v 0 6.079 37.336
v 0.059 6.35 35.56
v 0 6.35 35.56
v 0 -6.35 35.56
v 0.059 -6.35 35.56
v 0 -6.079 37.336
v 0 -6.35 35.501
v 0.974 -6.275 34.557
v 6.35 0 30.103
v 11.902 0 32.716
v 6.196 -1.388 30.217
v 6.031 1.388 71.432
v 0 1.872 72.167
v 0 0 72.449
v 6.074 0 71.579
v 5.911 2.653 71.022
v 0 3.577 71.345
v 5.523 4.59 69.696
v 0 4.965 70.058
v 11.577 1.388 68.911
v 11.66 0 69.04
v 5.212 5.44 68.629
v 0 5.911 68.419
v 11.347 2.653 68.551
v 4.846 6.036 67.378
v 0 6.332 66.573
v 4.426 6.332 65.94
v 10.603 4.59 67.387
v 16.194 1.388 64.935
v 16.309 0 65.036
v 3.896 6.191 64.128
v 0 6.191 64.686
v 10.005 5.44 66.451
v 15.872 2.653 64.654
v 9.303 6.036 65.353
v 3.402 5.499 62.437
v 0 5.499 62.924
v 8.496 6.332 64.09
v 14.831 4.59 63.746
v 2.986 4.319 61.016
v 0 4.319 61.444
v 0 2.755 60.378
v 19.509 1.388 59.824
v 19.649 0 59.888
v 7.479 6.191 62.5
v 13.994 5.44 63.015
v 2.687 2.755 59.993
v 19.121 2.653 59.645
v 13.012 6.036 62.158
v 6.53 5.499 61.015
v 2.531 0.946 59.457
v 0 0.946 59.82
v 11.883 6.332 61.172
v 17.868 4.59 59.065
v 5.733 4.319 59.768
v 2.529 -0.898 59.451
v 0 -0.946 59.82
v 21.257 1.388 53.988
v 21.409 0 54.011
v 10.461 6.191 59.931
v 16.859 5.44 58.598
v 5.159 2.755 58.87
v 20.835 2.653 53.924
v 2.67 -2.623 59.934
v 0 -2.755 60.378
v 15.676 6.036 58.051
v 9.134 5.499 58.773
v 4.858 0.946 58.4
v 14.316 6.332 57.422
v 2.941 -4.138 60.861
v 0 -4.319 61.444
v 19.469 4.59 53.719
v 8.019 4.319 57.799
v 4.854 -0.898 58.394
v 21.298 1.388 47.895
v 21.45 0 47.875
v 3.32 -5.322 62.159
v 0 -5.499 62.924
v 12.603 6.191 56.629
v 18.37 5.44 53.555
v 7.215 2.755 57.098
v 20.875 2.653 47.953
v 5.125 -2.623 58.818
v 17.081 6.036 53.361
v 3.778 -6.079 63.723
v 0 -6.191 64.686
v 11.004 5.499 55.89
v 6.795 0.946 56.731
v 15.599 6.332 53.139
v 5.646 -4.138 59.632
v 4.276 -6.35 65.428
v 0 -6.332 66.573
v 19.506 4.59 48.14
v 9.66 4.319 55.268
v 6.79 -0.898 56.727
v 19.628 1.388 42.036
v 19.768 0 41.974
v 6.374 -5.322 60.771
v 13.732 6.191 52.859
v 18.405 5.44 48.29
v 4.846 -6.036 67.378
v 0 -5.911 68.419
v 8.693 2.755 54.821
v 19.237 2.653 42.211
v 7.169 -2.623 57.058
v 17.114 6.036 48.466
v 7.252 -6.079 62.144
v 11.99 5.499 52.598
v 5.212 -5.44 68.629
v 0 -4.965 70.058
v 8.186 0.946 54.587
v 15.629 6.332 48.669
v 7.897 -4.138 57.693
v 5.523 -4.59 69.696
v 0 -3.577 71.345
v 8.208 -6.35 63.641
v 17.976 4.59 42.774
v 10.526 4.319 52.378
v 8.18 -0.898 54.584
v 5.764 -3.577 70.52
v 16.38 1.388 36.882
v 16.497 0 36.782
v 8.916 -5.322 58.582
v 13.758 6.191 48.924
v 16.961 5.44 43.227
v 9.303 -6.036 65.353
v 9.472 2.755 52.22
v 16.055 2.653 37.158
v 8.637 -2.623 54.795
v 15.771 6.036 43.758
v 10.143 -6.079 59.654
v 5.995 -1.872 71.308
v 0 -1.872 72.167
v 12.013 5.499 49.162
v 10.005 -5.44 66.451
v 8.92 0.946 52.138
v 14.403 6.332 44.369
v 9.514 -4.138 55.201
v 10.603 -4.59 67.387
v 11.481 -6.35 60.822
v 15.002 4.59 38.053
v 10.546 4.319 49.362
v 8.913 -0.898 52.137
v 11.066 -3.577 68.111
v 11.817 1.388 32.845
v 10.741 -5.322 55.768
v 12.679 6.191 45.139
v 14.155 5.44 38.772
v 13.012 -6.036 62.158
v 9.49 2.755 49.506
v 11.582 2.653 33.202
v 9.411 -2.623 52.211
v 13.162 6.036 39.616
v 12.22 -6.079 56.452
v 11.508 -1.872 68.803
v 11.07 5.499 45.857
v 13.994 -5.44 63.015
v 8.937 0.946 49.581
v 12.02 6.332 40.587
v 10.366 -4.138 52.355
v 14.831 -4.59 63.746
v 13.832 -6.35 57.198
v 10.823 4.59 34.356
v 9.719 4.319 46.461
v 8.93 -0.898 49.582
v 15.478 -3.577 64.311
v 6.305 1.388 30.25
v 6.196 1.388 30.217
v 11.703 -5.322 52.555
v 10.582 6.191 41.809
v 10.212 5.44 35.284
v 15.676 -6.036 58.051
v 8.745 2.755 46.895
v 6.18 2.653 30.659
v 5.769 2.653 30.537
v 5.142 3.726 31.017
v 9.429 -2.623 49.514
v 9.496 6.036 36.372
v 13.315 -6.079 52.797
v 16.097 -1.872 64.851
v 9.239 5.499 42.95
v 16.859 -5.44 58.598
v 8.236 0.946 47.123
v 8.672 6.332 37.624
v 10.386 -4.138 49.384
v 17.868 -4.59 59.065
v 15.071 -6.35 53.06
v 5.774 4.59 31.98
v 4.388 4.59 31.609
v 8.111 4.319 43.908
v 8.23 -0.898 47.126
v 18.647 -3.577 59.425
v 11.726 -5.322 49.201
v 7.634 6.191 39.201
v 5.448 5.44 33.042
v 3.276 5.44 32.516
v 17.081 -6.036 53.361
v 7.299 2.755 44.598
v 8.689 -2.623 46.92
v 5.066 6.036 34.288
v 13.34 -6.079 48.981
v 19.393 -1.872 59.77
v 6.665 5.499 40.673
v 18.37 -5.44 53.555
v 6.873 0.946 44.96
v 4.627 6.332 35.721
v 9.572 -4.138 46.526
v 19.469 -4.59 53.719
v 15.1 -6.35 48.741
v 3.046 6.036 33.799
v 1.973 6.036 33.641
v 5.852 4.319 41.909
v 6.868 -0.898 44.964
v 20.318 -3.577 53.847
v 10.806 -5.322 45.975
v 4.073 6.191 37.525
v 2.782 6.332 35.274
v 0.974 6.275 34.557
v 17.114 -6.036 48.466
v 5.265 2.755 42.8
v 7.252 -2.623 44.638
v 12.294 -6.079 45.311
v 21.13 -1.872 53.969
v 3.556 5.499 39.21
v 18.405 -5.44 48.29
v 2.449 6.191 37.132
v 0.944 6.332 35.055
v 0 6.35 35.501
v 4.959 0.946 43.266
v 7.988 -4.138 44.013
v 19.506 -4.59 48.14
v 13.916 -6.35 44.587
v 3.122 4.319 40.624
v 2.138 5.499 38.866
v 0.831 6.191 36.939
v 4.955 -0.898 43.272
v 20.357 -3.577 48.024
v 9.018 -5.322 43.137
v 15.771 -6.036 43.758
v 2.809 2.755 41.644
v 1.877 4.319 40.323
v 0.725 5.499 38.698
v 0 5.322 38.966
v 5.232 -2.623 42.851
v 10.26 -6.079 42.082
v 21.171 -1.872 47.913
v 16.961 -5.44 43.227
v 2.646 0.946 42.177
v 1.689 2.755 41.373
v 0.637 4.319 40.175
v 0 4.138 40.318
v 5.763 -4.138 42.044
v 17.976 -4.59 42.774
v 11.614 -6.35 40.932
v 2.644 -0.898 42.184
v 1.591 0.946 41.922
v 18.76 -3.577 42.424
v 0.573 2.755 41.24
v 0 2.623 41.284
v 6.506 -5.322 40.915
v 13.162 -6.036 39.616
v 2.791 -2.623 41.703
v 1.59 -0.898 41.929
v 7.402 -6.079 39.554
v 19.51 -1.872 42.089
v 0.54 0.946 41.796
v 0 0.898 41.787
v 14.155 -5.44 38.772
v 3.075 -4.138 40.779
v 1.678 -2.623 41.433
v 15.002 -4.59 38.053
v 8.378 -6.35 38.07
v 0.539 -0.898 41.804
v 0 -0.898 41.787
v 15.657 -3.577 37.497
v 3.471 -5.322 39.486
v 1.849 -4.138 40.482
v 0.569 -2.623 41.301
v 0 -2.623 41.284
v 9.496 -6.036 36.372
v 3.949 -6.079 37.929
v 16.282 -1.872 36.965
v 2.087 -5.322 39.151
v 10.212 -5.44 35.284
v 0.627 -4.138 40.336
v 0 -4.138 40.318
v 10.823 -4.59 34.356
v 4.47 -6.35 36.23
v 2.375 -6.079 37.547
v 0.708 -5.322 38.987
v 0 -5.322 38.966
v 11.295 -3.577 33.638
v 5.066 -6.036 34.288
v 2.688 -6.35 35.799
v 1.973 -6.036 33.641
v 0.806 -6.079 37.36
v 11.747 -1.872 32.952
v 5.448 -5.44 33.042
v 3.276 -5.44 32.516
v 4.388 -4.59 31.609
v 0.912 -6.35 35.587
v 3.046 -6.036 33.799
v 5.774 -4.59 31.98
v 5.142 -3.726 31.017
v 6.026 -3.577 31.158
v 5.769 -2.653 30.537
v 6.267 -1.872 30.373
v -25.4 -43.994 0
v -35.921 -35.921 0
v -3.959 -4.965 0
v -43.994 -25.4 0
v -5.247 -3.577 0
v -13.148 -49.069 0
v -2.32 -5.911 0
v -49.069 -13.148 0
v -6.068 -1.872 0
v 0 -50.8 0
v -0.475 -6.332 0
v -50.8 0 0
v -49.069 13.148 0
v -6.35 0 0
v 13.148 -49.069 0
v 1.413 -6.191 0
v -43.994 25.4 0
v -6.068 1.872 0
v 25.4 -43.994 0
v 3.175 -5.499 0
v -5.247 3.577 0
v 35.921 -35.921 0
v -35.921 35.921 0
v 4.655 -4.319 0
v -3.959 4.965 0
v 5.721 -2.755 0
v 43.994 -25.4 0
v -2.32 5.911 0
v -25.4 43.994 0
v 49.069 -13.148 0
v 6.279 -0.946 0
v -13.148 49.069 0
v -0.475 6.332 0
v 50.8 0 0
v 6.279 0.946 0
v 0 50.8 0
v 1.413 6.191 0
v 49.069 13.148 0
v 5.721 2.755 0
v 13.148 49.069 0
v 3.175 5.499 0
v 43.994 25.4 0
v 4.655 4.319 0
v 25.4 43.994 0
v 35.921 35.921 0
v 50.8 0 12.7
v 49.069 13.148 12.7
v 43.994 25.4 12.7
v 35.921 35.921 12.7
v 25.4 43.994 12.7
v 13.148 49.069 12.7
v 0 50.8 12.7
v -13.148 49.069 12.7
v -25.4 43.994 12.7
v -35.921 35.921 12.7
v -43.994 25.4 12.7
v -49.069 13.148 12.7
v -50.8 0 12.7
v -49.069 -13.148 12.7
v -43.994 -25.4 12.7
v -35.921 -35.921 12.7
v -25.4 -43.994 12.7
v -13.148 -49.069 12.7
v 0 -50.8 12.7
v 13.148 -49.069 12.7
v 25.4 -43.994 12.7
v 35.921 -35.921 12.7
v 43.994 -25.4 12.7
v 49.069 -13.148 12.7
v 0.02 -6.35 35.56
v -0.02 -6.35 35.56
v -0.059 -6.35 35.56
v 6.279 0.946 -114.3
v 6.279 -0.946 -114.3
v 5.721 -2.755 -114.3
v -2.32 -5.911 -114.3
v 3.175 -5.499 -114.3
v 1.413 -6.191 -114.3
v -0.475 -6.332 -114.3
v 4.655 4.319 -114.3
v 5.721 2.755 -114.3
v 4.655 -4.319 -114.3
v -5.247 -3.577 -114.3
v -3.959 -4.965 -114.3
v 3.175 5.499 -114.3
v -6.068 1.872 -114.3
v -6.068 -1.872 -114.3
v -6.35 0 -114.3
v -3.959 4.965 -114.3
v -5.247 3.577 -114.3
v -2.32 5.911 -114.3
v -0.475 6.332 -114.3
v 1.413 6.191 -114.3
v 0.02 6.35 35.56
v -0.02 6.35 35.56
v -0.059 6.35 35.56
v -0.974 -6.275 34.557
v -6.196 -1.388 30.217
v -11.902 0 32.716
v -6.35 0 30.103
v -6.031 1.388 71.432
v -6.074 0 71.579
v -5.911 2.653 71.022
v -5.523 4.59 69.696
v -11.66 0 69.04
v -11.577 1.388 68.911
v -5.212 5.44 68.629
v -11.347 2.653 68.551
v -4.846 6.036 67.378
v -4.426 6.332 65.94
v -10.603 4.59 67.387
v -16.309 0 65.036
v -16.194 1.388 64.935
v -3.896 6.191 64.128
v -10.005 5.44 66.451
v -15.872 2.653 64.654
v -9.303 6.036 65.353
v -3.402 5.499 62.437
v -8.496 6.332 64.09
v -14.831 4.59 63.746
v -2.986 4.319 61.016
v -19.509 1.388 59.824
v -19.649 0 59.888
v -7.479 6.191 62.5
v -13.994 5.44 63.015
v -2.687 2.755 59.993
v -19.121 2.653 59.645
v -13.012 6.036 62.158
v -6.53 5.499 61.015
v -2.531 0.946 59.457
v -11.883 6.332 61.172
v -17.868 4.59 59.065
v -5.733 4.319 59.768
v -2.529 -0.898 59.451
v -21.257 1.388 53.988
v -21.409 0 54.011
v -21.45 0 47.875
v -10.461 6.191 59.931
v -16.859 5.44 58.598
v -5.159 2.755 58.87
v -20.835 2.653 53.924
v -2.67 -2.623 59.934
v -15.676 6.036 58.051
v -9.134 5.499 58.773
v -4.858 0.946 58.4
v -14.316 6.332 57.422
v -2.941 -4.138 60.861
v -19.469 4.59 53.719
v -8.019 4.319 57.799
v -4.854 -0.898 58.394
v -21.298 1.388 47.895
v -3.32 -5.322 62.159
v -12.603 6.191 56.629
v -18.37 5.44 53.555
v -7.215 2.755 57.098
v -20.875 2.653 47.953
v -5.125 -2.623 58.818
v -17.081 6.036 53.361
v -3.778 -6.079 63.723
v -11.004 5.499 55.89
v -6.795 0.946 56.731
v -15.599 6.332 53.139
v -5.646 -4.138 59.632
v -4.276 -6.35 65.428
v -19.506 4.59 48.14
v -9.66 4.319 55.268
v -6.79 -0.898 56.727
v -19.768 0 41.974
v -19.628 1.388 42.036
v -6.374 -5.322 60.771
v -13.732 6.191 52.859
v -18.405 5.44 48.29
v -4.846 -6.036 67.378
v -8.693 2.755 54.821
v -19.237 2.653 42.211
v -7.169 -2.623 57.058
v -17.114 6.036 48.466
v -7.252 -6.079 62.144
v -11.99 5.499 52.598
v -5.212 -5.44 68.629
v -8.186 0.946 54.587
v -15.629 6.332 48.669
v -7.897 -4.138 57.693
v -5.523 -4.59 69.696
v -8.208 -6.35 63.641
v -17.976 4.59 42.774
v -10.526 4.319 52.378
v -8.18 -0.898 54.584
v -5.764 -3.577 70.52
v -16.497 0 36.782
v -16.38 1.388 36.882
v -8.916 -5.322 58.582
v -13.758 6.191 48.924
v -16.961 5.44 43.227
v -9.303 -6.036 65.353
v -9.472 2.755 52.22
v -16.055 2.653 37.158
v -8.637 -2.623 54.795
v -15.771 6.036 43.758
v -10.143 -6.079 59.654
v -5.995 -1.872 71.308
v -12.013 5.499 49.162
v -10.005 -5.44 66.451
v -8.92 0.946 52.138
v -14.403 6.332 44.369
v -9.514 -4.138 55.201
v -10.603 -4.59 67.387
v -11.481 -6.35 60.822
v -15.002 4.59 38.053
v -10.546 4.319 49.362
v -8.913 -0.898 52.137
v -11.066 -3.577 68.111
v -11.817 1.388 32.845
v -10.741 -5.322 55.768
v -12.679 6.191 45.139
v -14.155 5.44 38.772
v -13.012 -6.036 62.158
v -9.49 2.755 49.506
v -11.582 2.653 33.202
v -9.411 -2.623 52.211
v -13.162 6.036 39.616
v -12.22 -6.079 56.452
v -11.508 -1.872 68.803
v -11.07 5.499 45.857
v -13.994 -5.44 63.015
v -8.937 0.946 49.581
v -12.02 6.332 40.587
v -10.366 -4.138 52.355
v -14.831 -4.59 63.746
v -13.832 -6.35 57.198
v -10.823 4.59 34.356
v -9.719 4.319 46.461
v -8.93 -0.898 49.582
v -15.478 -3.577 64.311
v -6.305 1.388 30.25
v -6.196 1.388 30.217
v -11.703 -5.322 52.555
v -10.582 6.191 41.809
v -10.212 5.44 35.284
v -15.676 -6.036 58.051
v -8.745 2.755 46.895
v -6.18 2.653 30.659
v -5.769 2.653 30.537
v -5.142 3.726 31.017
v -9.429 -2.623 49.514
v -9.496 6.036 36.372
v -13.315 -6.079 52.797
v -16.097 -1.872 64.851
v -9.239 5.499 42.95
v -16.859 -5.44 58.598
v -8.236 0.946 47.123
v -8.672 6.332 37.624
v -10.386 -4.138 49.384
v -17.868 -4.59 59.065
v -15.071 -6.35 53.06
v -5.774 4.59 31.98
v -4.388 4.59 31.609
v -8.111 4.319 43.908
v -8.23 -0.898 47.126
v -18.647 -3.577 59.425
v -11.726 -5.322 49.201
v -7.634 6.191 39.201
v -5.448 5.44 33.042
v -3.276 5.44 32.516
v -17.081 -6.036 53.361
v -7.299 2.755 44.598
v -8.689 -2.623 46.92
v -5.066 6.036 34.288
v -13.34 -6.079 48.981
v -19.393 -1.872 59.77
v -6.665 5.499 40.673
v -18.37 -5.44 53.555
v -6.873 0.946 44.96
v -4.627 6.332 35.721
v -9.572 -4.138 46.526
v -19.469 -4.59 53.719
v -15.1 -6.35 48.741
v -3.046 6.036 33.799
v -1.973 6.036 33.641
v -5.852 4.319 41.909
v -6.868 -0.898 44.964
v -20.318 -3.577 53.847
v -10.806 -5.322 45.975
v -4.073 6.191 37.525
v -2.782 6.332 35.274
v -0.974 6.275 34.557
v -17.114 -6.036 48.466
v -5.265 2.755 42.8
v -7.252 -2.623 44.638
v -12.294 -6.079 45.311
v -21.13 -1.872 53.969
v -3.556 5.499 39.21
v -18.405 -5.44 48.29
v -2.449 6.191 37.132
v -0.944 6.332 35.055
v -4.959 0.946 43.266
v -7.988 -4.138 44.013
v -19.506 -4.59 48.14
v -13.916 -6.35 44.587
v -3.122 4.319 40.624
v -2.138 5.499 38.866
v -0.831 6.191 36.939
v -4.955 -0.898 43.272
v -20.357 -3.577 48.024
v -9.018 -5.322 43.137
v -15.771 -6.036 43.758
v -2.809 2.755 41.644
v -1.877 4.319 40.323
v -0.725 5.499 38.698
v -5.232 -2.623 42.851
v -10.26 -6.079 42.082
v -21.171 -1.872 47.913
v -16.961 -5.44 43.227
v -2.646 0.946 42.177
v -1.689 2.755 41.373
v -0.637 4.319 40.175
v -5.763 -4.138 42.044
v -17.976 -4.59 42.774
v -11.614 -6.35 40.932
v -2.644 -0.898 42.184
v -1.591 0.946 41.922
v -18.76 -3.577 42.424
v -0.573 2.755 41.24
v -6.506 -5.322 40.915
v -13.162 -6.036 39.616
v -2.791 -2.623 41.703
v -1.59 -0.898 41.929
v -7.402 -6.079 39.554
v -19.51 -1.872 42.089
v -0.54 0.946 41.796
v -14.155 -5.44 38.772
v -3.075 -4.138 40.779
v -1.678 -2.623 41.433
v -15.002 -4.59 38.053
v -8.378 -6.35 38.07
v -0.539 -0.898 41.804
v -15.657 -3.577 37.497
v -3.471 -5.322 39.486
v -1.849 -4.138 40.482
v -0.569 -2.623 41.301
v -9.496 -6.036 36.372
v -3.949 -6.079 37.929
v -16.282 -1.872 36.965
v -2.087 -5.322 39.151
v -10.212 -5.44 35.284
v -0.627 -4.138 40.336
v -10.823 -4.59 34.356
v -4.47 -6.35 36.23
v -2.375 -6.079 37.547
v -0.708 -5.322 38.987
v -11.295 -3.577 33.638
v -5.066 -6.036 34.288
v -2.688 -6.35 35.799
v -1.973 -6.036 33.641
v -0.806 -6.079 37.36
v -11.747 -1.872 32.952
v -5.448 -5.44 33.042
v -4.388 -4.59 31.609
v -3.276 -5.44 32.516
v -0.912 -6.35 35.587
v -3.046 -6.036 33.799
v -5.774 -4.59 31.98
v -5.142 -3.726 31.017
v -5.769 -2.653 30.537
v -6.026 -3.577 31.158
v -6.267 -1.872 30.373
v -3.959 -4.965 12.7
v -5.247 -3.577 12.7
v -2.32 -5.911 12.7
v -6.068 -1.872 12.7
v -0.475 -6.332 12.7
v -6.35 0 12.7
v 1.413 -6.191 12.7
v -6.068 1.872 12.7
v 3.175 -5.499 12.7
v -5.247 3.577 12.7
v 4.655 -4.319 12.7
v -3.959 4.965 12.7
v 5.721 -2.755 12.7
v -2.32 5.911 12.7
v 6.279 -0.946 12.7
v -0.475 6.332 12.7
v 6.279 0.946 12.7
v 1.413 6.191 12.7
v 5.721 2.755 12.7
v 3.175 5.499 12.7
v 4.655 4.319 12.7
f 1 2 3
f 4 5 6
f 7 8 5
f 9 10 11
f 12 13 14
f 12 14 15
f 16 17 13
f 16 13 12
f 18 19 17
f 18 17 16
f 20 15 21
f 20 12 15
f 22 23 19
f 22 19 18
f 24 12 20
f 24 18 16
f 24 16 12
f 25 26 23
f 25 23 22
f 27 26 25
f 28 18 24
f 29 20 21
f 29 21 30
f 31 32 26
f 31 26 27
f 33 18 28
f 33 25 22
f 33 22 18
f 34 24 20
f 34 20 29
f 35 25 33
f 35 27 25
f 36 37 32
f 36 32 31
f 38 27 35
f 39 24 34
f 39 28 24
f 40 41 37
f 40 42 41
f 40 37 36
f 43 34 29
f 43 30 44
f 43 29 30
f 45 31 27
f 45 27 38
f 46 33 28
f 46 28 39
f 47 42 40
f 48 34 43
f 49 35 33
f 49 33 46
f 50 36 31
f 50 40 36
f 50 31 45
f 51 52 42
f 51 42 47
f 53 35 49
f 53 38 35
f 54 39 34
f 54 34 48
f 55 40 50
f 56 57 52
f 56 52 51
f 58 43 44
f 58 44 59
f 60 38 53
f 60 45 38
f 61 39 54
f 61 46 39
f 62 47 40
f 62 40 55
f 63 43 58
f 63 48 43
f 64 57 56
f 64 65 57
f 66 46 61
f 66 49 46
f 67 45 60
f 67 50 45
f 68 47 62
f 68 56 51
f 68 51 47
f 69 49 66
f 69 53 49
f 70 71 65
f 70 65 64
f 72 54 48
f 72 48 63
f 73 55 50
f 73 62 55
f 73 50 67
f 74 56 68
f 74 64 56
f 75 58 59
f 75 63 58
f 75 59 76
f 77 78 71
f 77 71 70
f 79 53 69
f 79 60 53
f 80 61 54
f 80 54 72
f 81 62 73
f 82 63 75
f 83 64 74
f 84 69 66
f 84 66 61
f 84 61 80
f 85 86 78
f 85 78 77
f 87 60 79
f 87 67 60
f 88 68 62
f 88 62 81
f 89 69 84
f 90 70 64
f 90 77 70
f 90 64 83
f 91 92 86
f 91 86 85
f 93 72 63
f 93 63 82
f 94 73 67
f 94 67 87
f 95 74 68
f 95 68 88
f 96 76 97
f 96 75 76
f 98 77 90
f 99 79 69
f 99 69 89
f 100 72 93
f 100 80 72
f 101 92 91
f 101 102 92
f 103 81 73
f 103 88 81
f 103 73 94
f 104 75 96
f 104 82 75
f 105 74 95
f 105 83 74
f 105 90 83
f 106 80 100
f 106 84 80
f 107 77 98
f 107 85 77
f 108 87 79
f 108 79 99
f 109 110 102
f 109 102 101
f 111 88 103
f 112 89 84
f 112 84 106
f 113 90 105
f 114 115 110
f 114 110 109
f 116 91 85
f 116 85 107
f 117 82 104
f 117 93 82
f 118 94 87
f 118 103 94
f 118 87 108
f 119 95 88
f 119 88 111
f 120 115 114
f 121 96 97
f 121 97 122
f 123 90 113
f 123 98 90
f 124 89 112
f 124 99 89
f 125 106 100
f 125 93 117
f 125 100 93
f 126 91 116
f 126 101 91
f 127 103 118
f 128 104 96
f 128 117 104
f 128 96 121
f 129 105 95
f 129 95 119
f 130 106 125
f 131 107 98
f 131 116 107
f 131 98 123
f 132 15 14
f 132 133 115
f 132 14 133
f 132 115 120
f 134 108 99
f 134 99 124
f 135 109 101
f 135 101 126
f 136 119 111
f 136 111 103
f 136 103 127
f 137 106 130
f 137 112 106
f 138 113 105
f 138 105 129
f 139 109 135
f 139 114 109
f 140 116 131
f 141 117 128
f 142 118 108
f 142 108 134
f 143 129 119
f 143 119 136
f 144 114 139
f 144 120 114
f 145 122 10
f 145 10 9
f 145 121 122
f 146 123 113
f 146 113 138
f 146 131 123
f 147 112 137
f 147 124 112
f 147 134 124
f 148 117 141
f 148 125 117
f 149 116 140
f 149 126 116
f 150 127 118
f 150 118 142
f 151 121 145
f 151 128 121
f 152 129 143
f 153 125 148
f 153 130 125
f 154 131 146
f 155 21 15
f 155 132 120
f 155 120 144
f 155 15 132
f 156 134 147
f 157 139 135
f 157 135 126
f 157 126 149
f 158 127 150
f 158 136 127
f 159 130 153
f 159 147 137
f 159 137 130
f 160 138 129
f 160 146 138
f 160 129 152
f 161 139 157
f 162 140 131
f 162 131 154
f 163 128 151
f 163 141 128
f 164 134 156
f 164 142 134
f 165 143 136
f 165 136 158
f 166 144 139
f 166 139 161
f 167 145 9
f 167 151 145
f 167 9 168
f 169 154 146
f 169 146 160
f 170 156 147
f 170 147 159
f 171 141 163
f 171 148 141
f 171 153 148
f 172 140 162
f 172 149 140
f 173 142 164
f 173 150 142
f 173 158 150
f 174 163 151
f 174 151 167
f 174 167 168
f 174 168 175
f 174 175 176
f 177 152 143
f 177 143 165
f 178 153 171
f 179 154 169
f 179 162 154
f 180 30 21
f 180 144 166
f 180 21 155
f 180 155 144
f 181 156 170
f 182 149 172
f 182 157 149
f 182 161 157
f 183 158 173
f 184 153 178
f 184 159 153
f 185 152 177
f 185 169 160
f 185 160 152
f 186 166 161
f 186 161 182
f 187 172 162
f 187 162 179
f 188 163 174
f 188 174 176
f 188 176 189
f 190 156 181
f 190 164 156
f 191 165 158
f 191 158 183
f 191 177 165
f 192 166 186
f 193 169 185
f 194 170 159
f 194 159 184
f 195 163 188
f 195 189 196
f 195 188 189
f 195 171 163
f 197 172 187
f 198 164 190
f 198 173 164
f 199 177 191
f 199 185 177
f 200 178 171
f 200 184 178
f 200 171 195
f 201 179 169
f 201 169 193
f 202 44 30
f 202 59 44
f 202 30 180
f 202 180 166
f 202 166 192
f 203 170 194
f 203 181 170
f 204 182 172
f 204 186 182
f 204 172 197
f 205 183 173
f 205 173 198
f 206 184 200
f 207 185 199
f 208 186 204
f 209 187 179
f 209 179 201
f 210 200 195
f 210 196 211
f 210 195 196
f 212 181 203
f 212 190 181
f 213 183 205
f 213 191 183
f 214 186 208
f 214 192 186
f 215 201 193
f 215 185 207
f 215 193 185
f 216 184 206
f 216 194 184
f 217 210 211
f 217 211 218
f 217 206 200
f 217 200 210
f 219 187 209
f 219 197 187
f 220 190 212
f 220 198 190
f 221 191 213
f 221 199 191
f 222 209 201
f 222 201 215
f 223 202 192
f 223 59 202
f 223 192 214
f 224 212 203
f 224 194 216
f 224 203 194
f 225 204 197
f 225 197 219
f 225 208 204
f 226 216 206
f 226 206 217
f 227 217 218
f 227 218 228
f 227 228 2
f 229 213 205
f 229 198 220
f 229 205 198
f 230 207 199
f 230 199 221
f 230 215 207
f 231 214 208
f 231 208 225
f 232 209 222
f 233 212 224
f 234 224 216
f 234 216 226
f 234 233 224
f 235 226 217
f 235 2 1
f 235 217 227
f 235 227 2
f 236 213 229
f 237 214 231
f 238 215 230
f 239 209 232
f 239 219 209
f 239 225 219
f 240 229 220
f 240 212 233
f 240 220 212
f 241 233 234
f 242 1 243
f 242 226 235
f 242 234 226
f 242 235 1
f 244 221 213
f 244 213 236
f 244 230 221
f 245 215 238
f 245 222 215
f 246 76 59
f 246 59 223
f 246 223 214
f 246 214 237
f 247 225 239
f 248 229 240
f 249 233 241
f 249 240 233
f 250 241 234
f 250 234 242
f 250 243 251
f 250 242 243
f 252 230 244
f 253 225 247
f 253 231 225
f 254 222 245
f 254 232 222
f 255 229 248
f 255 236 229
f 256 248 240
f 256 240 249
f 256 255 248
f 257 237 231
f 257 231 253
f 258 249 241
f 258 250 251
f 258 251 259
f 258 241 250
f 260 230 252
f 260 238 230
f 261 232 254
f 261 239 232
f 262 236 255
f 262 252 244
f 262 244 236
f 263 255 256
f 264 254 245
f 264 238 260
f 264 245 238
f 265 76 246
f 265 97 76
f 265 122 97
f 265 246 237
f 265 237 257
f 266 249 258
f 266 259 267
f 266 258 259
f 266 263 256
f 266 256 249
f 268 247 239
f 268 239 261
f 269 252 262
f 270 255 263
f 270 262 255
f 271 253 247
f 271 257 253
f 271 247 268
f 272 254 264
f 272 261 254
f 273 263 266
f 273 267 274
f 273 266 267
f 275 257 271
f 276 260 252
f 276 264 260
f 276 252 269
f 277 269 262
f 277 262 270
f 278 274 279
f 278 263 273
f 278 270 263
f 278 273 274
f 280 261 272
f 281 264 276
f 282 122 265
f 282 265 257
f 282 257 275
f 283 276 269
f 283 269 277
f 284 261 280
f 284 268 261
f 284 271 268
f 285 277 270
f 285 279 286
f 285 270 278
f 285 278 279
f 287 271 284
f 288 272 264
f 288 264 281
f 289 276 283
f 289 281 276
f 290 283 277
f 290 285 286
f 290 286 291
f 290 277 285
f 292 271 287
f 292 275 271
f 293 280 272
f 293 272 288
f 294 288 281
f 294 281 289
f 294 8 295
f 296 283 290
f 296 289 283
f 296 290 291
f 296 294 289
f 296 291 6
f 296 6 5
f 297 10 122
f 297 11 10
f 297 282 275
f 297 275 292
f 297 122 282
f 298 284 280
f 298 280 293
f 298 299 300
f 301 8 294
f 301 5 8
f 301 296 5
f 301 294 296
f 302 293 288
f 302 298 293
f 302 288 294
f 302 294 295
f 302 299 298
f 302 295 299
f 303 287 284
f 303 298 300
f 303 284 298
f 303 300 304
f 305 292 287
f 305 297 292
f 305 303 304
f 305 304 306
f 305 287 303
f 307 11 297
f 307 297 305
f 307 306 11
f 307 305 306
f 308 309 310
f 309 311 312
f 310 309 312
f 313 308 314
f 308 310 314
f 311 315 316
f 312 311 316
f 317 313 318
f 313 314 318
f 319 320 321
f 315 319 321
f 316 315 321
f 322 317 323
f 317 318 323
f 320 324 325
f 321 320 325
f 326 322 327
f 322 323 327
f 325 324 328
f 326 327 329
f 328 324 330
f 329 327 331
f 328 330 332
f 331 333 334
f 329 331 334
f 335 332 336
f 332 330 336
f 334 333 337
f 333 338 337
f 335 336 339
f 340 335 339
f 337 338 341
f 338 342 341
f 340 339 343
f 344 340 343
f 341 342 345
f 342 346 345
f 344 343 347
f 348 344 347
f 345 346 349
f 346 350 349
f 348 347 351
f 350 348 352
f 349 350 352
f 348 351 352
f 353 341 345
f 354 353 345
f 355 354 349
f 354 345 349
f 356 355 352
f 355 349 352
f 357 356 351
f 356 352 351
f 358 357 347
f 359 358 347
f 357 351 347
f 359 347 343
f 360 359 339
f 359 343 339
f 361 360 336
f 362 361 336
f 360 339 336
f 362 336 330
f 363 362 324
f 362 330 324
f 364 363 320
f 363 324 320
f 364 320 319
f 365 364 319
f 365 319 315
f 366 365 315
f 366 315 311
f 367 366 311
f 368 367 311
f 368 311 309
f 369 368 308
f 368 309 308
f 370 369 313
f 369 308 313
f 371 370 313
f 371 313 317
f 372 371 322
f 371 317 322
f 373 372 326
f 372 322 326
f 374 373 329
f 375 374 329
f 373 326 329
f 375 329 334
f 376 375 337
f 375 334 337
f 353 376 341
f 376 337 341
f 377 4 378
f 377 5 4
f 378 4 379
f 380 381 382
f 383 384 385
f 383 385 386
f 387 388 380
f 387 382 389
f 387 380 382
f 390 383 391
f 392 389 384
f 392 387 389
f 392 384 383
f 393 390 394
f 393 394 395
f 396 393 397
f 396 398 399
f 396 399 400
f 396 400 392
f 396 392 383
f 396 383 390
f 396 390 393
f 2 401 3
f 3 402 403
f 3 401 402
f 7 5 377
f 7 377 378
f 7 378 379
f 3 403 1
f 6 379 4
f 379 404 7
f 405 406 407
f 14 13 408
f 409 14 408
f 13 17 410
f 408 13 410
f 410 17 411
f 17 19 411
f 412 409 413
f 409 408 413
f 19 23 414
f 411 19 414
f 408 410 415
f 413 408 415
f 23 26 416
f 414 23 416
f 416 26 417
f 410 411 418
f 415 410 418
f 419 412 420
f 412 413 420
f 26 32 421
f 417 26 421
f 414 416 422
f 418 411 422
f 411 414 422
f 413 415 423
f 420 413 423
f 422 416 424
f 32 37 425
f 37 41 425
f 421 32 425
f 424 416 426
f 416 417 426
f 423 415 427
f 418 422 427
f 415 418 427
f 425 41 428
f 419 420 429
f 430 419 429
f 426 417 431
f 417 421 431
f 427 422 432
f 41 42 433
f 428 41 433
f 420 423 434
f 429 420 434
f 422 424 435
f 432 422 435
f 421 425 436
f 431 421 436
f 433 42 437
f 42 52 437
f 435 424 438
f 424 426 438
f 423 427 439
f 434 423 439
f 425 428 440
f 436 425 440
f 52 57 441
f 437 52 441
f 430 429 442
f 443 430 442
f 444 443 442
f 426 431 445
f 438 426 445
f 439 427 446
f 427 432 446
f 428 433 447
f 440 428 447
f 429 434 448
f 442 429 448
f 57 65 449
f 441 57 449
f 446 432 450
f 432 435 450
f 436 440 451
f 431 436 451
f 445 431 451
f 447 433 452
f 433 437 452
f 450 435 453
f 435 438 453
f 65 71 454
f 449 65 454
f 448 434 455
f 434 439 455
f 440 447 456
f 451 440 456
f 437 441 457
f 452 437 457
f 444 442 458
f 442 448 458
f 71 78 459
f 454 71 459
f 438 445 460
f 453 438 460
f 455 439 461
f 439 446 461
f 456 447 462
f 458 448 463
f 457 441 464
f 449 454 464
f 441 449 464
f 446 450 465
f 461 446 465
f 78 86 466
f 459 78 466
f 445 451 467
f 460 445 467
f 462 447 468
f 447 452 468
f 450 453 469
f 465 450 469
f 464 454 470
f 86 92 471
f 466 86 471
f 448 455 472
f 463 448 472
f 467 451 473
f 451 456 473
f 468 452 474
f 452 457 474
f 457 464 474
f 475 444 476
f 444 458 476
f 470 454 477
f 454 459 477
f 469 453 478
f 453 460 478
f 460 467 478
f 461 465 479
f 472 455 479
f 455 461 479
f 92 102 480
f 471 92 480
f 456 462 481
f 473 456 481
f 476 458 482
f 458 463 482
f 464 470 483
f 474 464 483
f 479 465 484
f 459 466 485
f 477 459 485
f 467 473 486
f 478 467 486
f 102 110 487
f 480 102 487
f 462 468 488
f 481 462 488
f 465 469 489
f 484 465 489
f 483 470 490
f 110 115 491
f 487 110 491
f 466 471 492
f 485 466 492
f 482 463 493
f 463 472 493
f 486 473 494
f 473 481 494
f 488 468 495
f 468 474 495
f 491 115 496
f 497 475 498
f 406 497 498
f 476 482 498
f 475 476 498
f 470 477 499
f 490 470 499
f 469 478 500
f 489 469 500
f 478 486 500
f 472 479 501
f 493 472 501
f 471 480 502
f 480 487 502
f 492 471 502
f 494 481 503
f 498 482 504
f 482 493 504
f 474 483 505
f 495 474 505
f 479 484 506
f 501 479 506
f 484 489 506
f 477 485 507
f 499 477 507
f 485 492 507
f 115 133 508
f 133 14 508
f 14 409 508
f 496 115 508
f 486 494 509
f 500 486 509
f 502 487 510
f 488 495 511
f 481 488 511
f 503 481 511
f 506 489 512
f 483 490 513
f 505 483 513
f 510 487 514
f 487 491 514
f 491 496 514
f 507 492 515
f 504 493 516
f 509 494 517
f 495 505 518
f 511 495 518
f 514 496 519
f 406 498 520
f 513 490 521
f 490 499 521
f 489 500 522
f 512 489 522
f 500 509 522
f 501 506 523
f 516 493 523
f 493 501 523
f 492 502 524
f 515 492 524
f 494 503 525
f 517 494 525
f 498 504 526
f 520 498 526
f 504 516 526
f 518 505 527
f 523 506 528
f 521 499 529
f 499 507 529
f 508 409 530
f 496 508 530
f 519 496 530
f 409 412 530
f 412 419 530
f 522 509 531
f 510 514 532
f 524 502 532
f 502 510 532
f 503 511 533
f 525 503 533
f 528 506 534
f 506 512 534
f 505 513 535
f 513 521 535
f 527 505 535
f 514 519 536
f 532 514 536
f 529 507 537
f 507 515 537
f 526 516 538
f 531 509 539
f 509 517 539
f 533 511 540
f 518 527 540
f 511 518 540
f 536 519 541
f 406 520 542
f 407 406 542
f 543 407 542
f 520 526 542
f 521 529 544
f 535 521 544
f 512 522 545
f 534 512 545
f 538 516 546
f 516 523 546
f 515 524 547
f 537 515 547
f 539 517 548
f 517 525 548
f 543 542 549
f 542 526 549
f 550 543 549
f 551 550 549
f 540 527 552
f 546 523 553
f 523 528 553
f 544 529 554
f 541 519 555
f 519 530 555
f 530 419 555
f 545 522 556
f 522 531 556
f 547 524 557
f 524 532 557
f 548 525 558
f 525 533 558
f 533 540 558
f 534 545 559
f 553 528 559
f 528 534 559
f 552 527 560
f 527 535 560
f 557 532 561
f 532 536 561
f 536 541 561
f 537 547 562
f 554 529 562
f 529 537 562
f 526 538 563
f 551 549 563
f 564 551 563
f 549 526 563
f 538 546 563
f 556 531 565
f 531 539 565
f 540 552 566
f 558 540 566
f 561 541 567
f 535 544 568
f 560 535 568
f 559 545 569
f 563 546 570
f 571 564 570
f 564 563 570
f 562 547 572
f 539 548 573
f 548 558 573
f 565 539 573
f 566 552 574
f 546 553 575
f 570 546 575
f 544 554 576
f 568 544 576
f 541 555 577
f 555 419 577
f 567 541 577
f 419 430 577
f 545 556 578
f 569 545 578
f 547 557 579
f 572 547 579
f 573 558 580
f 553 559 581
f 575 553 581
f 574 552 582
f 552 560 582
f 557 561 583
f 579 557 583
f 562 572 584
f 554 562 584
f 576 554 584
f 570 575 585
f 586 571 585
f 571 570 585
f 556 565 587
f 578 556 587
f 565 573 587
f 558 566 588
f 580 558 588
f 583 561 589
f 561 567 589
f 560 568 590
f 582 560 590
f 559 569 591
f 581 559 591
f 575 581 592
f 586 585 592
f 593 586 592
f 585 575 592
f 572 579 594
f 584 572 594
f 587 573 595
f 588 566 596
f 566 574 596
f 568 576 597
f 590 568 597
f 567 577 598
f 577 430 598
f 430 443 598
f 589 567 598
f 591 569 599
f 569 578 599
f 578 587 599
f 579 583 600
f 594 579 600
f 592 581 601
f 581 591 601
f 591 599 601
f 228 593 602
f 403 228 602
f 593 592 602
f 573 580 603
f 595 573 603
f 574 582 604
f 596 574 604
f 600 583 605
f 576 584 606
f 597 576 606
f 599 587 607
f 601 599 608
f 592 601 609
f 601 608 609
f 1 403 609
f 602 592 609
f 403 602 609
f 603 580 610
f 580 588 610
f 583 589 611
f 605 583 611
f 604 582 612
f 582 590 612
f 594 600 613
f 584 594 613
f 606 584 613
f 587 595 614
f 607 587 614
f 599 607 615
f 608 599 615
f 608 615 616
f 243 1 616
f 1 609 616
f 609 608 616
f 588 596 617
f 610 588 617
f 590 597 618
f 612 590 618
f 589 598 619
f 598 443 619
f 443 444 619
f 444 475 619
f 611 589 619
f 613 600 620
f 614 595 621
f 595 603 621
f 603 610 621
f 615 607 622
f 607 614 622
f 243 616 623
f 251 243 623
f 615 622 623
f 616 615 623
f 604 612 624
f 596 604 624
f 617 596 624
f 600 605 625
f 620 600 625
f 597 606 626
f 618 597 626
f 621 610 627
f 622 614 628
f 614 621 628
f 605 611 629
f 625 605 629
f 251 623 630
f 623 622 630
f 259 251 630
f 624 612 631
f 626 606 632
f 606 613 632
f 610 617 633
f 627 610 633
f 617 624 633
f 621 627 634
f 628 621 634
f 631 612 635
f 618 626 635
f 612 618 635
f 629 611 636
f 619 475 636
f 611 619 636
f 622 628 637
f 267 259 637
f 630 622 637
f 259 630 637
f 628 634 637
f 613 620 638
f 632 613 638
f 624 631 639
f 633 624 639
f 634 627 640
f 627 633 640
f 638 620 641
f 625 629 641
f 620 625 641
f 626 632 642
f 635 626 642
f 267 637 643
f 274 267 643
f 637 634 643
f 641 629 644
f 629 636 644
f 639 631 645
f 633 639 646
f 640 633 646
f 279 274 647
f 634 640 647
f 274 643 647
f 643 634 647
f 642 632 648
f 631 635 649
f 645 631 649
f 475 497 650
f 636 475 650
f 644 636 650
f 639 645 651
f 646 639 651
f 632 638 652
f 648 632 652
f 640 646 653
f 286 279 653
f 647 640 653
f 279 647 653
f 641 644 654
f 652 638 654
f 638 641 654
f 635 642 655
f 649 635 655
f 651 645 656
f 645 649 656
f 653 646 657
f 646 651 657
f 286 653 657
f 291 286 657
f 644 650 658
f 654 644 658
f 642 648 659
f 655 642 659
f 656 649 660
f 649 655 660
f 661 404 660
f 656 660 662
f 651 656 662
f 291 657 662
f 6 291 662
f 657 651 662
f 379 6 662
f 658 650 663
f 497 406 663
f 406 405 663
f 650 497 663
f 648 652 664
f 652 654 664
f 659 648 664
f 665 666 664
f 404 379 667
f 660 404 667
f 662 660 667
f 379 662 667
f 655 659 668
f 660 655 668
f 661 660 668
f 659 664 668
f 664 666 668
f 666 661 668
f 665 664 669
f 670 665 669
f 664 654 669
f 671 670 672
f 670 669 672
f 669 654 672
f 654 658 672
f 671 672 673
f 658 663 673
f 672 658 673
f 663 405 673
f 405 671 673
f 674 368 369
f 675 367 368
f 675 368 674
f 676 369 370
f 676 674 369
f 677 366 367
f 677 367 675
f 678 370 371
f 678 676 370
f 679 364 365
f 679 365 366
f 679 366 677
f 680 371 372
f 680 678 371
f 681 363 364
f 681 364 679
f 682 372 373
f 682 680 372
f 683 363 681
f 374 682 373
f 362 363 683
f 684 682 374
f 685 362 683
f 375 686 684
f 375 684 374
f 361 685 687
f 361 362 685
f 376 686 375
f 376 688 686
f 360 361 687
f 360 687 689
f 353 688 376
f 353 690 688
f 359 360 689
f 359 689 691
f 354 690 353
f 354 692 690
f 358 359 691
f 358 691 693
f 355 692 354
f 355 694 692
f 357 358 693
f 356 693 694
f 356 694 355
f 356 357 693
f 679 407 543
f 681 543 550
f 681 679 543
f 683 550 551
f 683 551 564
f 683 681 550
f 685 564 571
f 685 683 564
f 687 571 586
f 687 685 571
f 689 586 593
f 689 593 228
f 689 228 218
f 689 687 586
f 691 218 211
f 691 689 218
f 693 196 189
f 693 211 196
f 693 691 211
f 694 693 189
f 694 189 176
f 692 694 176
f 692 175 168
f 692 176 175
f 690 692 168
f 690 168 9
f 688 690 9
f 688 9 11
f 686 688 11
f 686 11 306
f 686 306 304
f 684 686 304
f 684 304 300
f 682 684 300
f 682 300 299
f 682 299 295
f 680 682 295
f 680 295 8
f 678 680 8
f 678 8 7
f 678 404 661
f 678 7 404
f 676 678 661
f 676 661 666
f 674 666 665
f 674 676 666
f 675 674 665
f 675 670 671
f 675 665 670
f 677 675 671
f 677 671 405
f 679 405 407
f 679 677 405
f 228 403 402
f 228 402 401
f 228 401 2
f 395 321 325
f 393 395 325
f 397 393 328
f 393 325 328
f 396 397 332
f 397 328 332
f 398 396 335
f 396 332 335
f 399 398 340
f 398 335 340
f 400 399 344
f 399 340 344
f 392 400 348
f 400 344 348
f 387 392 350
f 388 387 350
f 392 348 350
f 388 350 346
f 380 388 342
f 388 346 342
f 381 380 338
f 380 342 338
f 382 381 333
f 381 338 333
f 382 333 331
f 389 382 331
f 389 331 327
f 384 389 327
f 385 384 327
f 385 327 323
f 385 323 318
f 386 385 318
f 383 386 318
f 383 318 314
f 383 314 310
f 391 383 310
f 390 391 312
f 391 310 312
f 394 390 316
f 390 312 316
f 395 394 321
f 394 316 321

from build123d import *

# Parameters (mm, degrees)
SKETCH1_R                = 50.8
BOSS_EXTRUDE1_DEPTH      = 12.7
SKETCH2_R                = 6.35
BOSS_EXTRUDE2_DEPTH      = 114.3
BOSS_EXTRUDE2_DEPTH_BACK = 35.56
SKETCH4_R                = 6.35


with BuildPart() as part:
    # Sketch1 → Boss-Extrude1 (new body)
    with BuildSketch(Plane.XY):
        Circle(SKETCH1_R)
    extrude(amount=BOSS_EXTRUDE1_DEPTH)

    # Sketch2 → Boss-Extrude2 (add, two sides)
    with BuildSketch(Plane(origin=(0, 0, 0), x_dir=(-1, 0, 0), z_dir=(0, 0, -1))) as boss_extrude2_sk:
        Circle(SKETCH2_R)
    extrude(amount=BOSS_EXTRUDE2_DEPTH)
    extrude(boss_extrude2_sk.sketch, amount=-BOSS_EXTRUDE2_DEPTH_BACK)

    # Sweep3: sweep along a path in Sketch3
    with BuildLine(Plane(origin=(0, 0, 0), x_dir=(1, 0, 0), z_dir=(0, 1, 0))) as sweep3_path:
        ThreePointArc((0, -66.04), (15.24, -50.8), (0, -35.56))
    # Sketch4 → Sweep3 (sweep)
    with BuildSketch(Plane.XY.offset(50.8)):
        with Locations((15.298746374, 0)):
            Circle(SKETCH4_R)
    sweep3 = sweep(path=sweep3_path.line)

    # Mirror1: Sweep3 across plane
    add(sweep3.mirror(Plane(origin=(0, 0, 66.098746374), x_dir=(0, 0, 1), z_dir=(-1, 0, 0))))


solid = part.part
